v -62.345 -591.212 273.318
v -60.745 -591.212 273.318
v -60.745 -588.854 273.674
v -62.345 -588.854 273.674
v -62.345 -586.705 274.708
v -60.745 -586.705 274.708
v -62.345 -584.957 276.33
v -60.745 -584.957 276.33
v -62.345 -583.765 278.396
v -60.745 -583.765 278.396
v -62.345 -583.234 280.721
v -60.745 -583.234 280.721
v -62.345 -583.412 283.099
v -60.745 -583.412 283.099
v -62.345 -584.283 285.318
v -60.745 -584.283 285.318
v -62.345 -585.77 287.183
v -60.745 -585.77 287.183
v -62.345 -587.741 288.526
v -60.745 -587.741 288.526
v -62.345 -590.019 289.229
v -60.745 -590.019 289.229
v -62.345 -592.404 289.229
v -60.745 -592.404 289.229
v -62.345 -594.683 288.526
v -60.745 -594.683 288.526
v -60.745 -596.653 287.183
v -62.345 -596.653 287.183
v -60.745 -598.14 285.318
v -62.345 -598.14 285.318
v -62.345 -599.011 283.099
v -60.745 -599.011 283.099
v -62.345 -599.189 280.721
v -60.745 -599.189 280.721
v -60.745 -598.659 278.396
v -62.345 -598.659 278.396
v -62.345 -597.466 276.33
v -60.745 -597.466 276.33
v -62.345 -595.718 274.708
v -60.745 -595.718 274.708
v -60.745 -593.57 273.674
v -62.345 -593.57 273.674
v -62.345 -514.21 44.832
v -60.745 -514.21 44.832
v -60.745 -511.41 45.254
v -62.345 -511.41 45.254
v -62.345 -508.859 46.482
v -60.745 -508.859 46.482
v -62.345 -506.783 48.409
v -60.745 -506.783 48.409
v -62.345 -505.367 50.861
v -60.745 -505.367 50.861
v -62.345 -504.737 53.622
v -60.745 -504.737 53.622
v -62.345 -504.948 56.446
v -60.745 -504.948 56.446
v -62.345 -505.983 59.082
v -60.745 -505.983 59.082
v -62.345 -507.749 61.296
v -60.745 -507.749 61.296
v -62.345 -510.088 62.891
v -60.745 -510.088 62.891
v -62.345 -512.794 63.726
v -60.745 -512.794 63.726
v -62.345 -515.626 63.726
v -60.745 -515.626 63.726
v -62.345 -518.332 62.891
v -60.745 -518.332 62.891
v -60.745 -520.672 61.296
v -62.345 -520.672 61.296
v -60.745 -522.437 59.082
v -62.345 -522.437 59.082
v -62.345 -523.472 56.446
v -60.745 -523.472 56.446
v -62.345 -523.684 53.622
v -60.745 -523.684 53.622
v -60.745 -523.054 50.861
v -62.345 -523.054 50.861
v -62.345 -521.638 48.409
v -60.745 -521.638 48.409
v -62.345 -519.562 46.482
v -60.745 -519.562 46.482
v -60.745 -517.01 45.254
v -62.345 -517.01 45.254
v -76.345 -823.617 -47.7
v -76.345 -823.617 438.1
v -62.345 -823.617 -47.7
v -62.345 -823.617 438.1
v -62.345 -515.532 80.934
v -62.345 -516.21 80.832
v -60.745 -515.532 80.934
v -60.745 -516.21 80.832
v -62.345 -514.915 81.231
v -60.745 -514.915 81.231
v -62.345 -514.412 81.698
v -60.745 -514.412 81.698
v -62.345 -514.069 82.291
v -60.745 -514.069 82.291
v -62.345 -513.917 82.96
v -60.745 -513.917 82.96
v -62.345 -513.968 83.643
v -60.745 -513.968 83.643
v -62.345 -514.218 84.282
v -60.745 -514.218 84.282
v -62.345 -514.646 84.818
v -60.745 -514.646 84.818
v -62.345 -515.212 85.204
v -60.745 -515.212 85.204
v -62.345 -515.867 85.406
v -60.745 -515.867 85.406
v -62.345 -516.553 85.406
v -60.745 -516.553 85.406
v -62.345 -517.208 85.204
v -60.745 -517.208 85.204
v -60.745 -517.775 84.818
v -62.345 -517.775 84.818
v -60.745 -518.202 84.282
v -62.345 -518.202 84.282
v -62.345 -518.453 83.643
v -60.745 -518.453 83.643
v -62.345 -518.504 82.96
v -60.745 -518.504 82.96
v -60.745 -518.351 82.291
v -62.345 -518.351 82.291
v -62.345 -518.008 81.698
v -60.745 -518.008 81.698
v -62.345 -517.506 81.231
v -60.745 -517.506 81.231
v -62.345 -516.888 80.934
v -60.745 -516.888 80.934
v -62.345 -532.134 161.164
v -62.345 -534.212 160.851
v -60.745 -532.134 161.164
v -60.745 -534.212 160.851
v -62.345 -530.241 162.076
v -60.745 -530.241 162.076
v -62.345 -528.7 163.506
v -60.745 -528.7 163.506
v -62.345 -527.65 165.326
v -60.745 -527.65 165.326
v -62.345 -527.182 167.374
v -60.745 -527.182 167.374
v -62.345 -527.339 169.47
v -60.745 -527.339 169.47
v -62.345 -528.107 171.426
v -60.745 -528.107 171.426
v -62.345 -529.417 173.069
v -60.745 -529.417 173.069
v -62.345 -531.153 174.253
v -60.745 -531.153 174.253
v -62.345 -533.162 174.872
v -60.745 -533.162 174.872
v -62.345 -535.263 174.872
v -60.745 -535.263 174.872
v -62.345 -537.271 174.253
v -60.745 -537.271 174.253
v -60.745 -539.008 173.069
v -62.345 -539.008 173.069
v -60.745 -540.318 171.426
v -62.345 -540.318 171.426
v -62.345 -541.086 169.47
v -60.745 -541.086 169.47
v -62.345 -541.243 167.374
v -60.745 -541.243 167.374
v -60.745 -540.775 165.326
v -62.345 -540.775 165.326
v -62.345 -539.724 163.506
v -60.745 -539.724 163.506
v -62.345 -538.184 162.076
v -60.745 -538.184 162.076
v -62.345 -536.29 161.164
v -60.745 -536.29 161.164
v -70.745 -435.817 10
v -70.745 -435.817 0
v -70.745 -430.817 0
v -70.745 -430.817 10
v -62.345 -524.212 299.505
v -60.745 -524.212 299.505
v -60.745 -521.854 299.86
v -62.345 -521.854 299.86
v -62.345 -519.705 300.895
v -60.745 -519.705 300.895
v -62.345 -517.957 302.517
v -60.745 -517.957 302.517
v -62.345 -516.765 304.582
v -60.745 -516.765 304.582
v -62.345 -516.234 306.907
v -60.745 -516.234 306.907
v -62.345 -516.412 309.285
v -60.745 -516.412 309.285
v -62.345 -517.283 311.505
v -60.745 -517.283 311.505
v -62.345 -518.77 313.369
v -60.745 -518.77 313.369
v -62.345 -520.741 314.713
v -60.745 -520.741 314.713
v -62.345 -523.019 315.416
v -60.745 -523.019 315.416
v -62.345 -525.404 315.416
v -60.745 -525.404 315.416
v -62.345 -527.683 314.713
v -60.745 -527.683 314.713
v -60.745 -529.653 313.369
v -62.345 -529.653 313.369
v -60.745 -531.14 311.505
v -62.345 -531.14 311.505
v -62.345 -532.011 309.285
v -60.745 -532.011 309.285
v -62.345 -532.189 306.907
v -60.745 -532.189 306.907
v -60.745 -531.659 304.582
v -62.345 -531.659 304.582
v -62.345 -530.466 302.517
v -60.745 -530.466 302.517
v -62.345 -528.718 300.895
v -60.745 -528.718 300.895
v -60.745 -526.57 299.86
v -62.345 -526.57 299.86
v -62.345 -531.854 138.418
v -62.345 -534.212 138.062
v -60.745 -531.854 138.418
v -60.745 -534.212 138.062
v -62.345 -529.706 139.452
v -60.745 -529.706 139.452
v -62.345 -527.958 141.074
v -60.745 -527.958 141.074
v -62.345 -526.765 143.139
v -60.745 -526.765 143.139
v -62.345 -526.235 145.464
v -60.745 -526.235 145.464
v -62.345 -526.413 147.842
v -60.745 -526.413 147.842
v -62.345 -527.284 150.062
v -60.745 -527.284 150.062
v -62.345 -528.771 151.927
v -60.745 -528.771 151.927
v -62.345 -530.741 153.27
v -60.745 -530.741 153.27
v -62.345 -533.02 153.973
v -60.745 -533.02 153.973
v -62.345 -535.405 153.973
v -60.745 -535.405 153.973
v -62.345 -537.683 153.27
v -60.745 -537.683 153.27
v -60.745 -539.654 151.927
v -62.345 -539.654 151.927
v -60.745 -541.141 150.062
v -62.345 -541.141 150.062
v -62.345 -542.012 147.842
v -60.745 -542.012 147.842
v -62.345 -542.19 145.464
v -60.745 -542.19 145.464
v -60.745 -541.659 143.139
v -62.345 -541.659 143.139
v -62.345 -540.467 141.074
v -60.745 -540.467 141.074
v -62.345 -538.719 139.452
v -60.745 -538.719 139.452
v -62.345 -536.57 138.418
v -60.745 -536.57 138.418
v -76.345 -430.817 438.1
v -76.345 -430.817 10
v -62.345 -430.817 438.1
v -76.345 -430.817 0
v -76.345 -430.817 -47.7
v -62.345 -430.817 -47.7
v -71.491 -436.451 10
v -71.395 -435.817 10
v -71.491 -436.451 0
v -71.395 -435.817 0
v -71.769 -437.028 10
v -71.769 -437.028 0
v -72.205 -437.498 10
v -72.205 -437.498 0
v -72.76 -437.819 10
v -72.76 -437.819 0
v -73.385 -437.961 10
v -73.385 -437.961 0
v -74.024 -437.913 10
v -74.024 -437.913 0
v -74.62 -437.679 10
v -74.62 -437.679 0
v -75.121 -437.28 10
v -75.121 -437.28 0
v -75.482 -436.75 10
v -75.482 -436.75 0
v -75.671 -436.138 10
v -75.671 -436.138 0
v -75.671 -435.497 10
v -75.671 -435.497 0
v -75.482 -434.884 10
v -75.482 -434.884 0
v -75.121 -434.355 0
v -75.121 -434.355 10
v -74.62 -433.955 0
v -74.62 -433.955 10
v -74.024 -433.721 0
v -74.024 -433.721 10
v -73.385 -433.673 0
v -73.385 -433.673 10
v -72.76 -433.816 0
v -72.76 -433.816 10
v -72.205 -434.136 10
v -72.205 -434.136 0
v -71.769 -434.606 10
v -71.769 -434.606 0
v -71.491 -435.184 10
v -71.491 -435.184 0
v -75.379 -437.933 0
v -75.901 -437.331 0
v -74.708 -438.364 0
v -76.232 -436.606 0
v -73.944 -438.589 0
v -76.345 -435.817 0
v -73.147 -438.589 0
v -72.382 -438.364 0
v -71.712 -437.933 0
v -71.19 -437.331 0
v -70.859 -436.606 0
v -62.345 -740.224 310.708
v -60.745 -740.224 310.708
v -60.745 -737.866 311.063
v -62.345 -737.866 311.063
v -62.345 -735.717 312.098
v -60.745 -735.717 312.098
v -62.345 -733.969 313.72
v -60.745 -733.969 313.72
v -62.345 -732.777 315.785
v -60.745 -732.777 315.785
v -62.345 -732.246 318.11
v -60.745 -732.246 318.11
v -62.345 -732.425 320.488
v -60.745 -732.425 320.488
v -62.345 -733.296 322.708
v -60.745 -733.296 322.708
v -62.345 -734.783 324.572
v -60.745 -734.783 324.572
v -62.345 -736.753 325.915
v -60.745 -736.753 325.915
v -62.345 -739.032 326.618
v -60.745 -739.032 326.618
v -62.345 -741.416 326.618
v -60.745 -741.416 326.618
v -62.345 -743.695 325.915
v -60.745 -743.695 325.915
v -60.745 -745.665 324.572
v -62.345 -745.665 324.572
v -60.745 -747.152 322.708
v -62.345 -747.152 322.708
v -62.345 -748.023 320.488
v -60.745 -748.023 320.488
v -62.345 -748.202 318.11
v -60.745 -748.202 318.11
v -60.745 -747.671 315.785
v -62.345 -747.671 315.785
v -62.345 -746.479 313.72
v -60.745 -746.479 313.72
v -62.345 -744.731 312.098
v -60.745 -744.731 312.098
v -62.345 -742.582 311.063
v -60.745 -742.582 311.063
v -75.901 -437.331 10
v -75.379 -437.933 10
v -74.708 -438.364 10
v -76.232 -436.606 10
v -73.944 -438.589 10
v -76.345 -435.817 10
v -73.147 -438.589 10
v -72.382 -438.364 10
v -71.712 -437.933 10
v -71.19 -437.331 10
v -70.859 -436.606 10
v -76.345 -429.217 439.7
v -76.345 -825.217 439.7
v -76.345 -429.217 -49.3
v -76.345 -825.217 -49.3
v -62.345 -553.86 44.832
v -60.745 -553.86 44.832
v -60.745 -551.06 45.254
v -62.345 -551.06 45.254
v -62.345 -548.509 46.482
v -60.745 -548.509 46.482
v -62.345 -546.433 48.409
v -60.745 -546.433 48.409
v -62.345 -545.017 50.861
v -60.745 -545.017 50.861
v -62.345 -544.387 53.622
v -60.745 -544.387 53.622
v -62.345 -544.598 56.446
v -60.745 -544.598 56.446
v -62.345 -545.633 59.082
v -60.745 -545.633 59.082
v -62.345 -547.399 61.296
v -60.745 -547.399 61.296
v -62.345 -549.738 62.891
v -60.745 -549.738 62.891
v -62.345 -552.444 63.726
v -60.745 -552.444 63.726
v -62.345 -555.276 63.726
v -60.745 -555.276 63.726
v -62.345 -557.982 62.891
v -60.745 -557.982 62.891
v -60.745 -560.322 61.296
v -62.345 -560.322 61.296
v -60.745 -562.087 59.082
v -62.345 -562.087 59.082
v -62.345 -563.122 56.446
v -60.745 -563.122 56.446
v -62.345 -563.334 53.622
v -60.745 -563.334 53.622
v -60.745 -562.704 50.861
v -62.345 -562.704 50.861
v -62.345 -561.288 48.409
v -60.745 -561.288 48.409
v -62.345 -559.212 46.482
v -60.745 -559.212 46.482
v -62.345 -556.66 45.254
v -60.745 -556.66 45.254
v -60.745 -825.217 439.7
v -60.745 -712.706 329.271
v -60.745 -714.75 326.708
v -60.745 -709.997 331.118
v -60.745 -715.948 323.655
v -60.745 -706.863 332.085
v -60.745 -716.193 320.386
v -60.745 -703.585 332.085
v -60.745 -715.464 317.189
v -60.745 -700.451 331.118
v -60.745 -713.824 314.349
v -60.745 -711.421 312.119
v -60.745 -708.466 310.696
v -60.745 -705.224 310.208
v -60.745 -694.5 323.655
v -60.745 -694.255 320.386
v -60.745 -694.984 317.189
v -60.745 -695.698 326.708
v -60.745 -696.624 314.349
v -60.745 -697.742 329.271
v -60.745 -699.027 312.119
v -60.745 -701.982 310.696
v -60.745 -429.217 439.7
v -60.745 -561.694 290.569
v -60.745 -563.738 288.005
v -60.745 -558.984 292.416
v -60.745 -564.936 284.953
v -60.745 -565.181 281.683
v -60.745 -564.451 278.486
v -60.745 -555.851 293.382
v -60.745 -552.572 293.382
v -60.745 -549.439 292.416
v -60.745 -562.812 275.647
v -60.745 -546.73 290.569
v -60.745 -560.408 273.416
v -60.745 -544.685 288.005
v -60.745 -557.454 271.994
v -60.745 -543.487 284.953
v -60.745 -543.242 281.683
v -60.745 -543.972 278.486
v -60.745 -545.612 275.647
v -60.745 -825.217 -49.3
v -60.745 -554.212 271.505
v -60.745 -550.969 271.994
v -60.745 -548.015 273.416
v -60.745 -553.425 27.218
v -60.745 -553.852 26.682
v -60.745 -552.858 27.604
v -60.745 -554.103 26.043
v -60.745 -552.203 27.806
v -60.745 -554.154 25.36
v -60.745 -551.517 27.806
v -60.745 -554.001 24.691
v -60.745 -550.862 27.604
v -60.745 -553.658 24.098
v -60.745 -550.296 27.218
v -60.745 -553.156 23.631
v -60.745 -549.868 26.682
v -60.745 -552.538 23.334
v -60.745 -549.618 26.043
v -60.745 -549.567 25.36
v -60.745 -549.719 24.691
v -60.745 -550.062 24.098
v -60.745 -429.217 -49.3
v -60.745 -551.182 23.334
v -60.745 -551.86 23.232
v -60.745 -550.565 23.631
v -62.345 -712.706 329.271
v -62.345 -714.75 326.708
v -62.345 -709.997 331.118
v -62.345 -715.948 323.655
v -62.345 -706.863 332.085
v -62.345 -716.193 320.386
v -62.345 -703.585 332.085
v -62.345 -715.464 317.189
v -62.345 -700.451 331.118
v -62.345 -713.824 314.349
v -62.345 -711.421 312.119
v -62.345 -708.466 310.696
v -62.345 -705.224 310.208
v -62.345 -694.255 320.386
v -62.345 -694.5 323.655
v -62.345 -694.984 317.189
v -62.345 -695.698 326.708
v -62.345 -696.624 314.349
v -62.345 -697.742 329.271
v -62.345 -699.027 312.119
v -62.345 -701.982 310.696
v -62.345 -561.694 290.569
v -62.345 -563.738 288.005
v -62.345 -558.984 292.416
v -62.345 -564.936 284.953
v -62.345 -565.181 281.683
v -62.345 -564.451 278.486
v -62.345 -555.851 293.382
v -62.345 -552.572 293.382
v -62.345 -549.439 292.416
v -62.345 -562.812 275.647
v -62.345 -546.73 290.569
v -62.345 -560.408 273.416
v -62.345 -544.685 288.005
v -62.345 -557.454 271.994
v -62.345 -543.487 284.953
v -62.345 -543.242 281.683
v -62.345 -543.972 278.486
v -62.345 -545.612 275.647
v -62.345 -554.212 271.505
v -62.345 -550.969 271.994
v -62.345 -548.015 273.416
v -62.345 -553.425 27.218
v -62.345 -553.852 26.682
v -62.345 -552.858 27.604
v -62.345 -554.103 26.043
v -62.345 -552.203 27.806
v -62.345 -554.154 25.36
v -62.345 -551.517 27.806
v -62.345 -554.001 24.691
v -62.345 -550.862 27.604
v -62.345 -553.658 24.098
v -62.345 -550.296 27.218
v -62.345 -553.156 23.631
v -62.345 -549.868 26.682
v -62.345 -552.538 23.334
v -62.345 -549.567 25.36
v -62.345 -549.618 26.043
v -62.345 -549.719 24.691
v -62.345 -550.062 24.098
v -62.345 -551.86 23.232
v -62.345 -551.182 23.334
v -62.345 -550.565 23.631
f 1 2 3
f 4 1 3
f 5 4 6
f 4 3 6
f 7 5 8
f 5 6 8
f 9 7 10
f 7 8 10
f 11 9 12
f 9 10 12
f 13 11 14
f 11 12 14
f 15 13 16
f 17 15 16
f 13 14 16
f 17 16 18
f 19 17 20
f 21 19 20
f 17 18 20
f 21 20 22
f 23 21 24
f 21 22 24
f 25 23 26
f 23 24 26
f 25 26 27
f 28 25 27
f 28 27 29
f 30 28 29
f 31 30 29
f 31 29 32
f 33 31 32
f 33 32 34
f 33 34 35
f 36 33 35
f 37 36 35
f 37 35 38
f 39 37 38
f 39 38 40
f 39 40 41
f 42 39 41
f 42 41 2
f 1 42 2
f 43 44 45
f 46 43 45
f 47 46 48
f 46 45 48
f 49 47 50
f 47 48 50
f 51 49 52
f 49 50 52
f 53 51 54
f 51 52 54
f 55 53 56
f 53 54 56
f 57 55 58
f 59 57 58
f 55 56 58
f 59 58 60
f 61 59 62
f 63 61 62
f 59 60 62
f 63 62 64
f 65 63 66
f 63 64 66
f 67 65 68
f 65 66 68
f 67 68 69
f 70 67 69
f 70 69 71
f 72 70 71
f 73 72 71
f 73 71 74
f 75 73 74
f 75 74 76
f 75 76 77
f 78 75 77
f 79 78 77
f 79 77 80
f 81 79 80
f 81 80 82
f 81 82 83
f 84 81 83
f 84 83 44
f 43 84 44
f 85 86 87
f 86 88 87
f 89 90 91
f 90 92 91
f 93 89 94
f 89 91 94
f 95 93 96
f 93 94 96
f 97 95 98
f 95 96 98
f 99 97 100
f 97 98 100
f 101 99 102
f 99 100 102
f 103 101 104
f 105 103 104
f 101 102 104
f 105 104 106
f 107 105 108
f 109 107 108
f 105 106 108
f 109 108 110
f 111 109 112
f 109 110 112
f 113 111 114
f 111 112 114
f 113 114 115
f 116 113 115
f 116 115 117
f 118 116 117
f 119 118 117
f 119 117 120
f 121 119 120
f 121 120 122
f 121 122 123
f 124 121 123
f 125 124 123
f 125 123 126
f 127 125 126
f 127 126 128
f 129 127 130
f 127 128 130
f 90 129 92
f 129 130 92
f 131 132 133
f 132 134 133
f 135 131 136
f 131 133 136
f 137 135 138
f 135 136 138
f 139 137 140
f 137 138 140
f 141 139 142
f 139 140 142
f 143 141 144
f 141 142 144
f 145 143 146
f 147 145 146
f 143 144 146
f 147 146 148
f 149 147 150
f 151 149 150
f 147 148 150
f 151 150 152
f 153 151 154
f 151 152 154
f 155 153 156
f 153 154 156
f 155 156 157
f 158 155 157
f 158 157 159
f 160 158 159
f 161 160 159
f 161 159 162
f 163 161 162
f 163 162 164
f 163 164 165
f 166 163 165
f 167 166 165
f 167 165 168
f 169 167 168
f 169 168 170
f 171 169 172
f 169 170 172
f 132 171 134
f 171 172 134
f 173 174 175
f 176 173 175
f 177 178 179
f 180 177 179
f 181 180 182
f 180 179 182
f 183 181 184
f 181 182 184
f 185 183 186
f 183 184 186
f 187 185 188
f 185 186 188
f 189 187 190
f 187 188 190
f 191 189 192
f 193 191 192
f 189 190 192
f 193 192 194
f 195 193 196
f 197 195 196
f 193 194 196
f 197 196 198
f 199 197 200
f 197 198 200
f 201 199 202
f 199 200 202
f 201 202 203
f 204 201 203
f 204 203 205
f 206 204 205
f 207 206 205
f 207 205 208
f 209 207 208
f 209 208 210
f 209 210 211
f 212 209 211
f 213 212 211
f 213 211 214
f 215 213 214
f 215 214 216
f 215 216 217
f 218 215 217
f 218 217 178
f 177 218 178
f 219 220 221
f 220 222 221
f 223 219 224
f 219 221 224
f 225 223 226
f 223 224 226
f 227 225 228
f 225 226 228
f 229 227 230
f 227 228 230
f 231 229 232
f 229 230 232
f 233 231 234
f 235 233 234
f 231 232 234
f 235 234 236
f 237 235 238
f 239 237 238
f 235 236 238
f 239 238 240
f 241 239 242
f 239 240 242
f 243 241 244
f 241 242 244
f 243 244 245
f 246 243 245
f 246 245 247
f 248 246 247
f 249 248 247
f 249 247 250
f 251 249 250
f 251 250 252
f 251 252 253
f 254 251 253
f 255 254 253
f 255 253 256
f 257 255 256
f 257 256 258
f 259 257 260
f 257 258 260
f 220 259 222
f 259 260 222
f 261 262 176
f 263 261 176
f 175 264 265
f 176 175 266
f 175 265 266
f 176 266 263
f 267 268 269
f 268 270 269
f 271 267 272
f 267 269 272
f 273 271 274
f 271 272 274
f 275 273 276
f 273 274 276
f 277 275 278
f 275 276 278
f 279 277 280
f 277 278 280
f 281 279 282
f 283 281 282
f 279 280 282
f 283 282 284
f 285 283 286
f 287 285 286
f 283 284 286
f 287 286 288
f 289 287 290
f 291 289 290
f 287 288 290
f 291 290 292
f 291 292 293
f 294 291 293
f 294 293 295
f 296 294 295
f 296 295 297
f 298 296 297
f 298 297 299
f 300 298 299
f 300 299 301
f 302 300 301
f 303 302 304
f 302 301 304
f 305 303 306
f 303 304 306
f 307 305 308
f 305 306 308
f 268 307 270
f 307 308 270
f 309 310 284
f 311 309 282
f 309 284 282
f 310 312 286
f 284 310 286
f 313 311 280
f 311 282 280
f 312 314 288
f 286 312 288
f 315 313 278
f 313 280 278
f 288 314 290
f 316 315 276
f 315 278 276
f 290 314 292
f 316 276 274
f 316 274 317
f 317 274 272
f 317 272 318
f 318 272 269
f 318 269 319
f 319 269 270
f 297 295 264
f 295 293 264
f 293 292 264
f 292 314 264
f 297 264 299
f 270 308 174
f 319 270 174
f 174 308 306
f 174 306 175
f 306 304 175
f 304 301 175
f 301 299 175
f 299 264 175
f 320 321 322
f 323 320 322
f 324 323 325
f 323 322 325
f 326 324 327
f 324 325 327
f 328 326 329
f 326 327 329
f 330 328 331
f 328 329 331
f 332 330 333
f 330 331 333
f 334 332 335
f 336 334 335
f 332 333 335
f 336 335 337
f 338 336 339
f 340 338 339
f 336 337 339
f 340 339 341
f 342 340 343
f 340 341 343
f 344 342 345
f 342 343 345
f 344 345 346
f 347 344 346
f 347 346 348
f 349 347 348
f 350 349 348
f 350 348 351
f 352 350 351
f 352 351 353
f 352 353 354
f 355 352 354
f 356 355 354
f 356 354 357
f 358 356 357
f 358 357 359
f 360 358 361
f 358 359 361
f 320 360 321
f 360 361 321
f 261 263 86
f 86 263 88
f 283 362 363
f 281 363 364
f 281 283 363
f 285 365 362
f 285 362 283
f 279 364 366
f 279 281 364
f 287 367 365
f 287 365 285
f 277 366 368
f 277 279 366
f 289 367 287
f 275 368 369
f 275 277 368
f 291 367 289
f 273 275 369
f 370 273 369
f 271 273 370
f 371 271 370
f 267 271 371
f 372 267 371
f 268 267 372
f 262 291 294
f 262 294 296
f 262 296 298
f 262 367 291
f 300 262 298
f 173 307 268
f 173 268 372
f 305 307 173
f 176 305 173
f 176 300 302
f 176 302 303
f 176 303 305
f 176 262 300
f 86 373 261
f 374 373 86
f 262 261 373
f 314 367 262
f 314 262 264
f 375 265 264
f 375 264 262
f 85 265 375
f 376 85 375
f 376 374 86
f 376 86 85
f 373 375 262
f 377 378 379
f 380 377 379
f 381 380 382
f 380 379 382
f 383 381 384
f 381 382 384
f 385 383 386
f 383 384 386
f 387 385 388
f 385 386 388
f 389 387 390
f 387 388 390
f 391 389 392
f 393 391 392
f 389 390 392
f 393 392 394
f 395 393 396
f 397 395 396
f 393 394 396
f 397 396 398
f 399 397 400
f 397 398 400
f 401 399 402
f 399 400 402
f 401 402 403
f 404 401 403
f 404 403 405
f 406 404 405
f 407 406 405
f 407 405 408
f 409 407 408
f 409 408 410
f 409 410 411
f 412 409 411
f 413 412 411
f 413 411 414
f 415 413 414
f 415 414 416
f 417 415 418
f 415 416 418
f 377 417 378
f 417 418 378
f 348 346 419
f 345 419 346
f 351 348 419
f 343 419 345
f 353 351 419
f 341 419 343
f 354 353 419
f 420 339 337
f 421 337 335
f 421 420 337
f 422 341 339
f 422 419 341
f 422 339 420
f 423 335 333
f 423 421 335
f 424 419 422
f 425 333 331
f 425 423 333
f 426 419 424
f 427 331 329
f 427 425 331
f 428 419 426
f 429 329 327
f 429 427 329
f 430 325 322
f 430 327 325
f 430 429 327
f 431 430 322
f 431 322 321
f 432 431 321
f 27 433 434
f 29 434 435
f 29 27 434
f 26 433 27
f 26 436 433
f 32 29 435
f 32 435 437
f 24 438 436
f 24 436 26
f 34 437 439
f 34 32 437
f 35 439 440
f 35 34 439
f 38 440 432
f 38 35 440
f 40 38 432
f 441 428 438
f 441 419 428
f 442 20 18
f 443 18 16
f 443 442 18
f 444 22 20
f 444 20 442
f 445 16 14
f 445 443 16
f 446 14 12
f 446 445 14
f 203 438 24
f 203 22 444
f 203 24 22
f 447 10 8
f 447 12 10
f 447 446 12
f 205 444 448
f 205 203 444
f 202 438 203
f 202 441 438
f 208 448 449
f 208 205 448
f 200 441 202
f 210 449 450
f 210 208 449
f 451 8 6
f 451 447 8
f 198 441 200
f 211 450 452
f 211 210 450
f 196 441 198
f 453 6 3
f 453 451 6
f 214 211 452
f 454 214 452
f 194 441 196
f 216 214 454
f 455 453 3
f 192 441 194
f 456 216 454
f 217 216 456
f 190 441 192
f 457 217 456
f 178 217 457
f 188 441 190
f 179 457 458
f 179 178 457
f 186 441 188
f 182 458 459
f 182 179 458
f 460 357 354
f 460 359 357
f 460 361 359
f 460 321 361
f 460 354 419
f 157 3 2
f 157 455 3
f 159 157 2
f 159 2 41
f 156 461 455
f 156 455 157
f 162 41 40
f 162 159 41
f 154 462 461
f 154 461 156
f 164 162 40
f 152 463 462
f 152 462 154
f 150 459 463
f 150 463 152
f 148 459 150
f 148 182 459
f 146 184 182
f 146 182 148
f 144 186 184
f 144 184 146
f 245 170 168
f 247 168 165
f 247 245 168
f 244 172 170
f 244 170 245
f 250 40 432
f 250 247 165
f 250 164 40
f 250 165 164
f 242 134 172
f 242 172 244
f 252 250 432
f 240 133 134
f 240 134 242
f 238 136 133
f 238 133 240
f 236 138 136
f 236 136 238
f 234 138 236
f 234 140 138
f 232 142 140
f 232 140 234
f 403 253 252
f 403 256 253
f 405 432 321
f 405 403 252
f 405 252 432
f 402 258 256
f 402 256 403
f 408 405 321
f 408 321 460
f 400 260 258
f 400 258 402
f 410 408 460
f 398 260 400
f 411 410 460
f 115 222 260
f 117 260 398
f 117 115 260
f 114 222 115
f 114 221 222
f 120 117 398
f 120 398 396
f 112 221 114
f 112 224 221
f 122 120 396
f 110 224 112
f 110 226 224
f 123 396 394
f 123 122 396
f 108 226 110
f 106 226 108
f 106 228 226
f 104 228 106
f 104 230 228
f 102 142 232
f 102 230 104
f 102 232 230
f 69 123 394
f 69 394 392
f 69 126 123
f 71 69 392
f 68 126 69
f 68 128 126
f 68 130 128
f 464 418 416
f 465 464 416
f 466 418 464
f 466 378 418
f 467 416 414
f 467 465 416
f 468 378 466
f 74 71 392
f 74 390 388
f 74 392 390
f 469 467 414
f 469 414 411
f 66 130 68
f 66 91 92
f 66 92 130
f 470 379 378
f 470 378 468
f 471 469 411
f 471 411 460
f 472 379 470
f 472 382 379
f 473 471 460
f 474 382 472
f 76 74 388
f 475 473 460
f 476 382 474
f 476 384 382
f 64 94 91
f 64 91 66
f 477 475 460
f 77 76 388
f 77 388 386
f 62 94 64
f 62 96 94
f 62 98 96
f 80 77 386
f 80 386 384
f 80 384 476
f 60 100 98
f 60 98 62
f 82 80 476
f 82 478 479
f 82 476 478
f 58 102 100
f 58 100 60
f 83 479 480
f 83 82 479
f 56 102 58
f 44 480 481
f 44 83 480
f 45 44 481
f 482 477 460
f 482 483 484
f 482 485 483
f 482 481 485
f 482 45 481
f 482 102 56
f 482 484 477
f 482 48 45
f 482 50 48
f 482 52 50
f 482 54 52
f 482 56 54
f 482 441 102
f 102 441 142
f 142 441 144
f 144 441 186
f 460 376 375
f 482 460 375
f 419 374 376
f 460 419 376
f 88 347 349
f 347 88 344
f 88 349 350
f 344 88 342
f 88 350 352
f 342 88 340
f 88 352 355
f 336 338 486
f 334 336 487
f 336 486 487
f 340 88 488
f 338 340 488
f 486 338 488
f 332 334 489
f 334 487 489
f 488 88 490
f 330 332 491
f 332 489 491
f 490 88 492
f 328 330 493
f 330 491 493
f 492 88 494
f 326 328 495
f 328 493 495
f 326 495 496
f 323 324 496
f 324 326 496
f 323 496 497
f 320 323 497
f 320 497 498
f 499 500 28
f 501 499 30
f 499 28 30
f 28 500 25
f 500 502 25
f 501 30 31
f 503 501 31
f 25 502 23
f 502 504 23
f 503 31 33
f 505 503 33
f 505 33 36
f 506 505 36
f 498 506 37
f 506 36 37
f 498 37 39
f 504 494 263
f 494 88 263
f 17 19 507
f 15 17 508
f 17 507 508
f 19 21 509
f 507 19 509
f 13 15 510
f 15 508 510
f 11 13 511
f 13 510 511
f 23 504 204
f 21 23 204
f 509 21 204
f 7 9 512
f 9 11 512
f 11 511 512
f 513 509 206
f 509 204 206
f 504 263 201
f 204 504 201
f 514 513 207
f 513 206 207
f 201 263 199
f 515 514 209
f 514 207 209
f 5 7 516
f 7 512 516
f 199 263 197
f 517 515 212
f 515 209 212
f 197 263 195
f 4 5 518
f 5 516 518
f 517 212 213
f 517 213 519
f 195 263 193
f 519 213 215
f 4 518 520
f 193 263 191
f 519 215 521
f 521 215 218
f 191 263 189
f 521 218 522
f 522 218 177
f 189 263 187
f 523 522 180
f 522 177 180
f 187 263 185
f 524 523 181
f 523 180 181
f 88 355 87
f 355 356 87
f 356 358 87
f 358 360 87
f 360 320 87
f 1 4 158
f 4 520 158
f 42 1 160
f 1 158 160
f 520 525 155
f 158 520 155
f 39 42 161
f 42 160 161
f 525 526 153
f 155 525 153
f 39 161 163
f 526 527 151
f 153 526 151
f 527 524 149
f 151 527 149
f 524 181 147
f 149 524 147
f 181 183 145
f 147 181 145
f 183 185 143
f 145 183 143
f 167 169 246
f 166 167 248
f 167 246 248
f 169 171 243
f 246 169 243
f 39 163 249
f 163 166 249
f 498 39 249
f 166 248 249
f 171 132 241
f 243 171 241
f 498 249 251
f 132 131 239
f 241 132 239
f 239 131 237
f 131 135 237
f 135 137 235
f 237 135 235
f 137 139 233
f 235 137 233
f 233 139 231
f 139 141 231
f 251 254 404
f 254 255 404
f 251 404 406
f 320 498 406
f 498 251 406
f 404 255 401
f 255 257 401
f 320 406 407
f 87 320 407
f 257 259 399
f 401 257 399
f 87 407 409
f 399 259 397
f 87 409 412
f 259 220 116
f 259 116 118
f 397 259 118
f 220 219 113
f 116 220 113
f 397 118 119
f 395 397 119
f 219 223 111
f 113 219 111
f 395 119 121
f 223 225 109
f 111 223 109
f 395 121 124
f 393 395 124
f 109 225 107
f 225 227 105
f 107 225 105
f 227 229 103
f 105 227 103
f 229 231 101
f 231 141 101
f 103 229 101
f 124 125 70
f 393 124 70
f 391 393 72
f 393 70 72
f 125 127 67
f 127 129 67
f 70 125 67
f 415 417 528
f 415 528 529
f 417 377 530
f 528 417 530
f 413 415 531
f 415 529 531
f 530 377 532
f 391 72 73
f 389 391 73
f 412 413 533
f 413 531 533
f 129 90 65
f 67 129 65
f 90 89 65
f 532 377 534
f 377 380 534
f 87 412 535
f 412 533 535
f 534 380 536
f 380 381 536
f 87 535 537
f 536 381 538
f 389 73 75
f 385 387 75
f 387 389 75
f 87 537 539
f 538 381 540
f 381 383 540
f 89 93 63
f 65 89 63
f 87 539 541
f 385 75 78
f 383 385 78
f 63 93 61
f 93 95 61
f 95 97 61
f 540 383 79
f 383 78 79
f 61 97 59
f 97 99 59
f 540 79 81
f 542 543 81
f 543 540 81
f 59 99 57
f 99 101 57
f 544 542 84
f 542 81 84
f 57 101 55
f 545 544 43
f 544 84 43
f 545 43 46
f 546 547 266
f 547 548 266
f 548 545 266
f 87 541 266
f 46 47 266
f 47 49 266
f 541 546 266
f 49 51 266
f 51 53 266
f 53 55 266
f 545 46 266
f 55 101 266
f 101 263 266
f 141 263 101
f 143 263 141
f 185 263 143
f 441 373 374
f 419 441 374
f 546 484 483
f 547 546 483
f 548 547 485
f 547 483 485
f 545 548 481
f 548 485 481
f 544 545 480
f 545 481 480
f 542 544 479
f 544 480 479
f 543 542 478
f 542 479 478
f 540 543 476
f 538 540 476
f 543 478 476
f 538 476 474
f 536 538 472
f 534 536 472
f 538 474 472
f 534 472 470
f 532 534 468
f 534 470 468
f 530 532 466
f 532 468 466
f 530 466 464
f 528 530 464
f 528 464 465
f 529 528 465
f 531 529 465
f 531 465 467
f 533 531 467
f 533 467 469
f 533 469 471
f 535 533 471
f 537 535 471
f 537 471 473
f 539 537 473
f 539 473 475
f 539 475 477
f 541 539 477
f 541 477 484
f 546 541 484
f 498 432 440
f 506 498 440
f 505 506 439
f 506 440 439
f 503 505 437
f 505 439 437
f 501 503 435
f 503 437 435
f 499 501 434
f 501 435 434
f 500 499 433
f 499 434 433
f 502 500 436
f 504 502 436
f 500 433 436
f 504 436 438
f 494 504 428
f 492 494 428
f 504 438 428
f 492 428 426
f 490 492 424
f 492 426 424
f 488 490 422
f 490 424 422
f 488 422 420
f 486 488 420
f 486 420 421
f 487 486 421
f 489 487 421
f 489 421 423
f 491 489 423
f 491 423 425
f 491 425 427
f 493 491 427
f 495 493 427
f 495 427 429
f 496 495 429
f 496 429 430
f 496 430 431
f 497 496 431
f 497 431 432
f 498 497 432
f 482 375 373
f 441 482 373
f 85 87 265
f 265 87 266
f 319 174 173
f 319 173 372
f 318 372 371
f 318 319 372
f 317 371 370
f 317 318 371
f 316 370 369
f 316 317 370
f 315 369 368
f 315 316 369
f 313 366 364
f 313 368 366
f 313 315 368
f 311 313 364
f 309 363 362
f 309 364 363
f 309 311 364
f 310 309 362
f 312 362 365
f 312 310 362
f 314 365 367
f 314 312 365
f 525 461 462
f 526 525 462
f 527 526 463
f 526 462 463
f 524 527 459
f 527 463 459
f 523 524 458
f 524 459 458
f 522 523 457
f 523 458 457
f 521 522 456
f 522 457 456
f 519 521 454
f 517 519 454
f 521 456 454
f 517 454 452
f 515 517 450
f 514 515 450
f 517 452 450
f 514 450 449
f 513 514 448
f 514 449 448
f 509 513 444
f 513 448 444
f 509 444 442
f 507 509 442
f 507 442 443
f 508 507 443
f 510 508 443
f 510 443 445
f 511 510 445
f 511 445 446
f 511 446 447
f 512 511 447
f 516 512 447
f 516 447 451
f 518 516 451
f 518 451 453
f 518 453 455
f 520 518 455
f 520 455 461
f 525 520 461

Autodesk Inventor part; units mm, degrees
ref_plane "YZ Plane" through (0, 0, 0) normal (1, 0, 0) x (0, 1, 0)
ref_plane "XZ Plane" through (0, 0, 0) normal (0, 1, 0) x (-1, 0, 0)
ref_plane "XY Plane" through (0, 0, 0) normal (0, 0, 1) x (1, 0, 0)
sketch "Sketch1" plane through (0, 0, 0) normal (0, 0, 1) x (1, 0, 0)
  circle A0 centre (-73.5453, -435.8173) radius 2.15 projected
  circle A1 centre (-73.5453, -435.8173) radius 2.8
  line L0 (-76.3453, -435.8173) -> (-70.7453, -435.8173)
  line L1 (-70.7453, -435.8173) -> (-70.7453, -430.8173)
  line L2 (-70.7453, -430.8173) -> (-76.3453, -430.8173)
  line L3 (-76.3453, -430.8173) -> (-76.3453, -435.8173)
  point P0 (0, 0)
  dimension "d1" = 5.6
  dimension "d2" = 5
extrude "Extrusion1" add sketch "Sketch1" along normal blind 10 contours L0 A1 A0 | A0 L0 A1 | A1 L3 L2 L1
sketch "Sketch2" plane through (-76.3453, -430.8173, 0) normal (0, 1, 0) x (1, 0, 0)
  line L0 (0, 49.3) -> (14, 49.3)
  line L1 (14, 49.3) -> (14, -439.7)
  line L2 (14, -439.7) -> (0, -439.7)
  line L3 (0, -439.7) -> (0, 49.3)
  line L4 (-11.8992, -390) -> (-11.8992, -380) projected
  line L5 (-11.8992, -380) -> (0.8131, -380) projected
  line L6 (0.8131, -380) -> (0.8131, -390) projected
  line L7 (0.8131, -390) -> (-11.8992, -390) projected
  line L8 (-11.8992, 0) -> (-11.8992, 10) projected
  line L9 (-11.8992, 10) -> (0.8131, 10) projected
  line L10 (0.8131, 10) -> (0.8131, 0) projected
  line L11 (0.8131, 0) -> (-11.8992, 0) projected
  line L12 (1.6631, -425.4) -> (1.6631, 35) projected
  line L13 (1.6631, 35) -> (308.0179, 35) projected
  line L14 (308.0179, 35) -> (308.0179, -425.4) projected
  line L15 (308.0179, -425.4) -> (1.6631, -425.4) projected
  line L16 (322.7236, -442.7) -> (322.7236, 52.3) projected
  line L17 (322.7236, 52.3) -> (-13.0426, 52.3) projected
  line L18 (-13.0426, 52.3) -> (-13.0426, -442.7) projected
  line L19 (-13.0426, -442.7) -> (322.7236, -442.7) projected
  point P0 (76.3453, 0)
  point P1 (0, -10)
  dimension "d5" = 14
  dimension "d6" = 489
  dimension "d7" = 3
  dimension "d8" = 3
extrude "Extrusion2" add sketch "Sketch2" along normal blind 1.6 contours L0 L1 L13 L12 L15 L2 L3 L7 L6 L5 L11 L10 L9 | L9 L10 L11 L3 | L1 L15 L12 L13 | L5 L6 L7 L3
sketch "Sketch3" plane through (-62.3453, -430.8173, 439.7) normal (1, 0, 0) x (0, 0, -1)
  line L0 (489, 0) -> (489, 1.6) projected
  line L1 (489, 1.6) -> (0, 1.6)
  line L2 (0, 1.6) -> (0, -394.4)
  line L3 (0, -394.4) -> (489, -394.4)
  line L4 (489, -394.4) -> (489, 1.6)
  point P0 (439.7, 430.8173)
  point P1 (489, 0)
  dimension "d11" = 396
extrude "Extrusion3" add sketch "Sketch3" along normal blind 1.6
sketch "Sketch4" plane through (-62.3453, -430.8173, 439.7) normal (-1, 0, 0) x (0, 0, 1)
  line L0 (0, 0) -> (-1.6, 0)
  line L1 (-1.6, 0) -> (-1.6, -394.4)
  line L2 (-1.6, -394.4) -> (0, -394.4)
  line L3 (0, -394.4) -> (0, 0)
  line L4 (-1.6, -392.8) -> (-489, -392.8)
  line L5 (-489, -392.8) -> (-489, -394.4)
  line L6 (-489, -394.4) -> (-1.6, -394.4)
  line L7 (-1.6, -394.4) -> (-1.6, -392.8)
  line L8 (-487.4, 0) -> (-489, 0)
  line L9 (-489, 0) -> (-489, -394.4)
  line L10 (-489, -394.4) -> (-487.4, -394.4)
  line L11 (-487.4, -394.4) -> (-487.4, 0)
  point P0 (-439.7, 430.8173)
  point P1 (0, -394.4)
  point P2 (-489, -394.4)
  point P3 (0, 0)
  point P4 (-487.4, -392.8)
  point P5 (-489, -392.8)
  point P6 (-1.6, -394.4)
  dimension "d14" = 1.6
  dimension "d15" = 1.6
  dimension "d16" = 1.6
extrude "Extrusion4" add sketch "Sketch4" along normal up to surface (14 mm away)
sketch "Sketch5" plane through (-60.7453, -430.8173, 439.7) normal (1, 0, 0) x (0, 0, -1)
  circle A0 centre (118.4923, -274.4067) radius 11 projected
  circle A1 centre (120.9923, -309.4067) radius 8 projected
  circle A2 centre (158.3816, -160.3944) radius 8 projected
  circle A3 centre (157.195, -123.3944) radius 11 projected
  circle A4 centre (132.195, -93.3944) radius 8 projected
  circle A5 centre (271.7988, -103.395) radius 7.05 projected
  circle A6 centre (293.6378, -103.395) radius 8 projected
  circle A7 centre (414.1683, -121.0429) radius 2.3 projected
  circle A8 centre (414.1683, -121.0429) radius 2.3 projected
  circle A9 centre (385.3683, -123.0429) radius 9.5 projected
  circle A10 centre (356.5683, -85.3929) radius 2.3 projected
  circle A11 centre (385.3683, -83.3929) radius 9.5 projected
  point P0 (439.7, 430.8173)
extrude "Extrusion5" cut sketch "Sketch5" along normal mid plane 100
properties part number "door"
